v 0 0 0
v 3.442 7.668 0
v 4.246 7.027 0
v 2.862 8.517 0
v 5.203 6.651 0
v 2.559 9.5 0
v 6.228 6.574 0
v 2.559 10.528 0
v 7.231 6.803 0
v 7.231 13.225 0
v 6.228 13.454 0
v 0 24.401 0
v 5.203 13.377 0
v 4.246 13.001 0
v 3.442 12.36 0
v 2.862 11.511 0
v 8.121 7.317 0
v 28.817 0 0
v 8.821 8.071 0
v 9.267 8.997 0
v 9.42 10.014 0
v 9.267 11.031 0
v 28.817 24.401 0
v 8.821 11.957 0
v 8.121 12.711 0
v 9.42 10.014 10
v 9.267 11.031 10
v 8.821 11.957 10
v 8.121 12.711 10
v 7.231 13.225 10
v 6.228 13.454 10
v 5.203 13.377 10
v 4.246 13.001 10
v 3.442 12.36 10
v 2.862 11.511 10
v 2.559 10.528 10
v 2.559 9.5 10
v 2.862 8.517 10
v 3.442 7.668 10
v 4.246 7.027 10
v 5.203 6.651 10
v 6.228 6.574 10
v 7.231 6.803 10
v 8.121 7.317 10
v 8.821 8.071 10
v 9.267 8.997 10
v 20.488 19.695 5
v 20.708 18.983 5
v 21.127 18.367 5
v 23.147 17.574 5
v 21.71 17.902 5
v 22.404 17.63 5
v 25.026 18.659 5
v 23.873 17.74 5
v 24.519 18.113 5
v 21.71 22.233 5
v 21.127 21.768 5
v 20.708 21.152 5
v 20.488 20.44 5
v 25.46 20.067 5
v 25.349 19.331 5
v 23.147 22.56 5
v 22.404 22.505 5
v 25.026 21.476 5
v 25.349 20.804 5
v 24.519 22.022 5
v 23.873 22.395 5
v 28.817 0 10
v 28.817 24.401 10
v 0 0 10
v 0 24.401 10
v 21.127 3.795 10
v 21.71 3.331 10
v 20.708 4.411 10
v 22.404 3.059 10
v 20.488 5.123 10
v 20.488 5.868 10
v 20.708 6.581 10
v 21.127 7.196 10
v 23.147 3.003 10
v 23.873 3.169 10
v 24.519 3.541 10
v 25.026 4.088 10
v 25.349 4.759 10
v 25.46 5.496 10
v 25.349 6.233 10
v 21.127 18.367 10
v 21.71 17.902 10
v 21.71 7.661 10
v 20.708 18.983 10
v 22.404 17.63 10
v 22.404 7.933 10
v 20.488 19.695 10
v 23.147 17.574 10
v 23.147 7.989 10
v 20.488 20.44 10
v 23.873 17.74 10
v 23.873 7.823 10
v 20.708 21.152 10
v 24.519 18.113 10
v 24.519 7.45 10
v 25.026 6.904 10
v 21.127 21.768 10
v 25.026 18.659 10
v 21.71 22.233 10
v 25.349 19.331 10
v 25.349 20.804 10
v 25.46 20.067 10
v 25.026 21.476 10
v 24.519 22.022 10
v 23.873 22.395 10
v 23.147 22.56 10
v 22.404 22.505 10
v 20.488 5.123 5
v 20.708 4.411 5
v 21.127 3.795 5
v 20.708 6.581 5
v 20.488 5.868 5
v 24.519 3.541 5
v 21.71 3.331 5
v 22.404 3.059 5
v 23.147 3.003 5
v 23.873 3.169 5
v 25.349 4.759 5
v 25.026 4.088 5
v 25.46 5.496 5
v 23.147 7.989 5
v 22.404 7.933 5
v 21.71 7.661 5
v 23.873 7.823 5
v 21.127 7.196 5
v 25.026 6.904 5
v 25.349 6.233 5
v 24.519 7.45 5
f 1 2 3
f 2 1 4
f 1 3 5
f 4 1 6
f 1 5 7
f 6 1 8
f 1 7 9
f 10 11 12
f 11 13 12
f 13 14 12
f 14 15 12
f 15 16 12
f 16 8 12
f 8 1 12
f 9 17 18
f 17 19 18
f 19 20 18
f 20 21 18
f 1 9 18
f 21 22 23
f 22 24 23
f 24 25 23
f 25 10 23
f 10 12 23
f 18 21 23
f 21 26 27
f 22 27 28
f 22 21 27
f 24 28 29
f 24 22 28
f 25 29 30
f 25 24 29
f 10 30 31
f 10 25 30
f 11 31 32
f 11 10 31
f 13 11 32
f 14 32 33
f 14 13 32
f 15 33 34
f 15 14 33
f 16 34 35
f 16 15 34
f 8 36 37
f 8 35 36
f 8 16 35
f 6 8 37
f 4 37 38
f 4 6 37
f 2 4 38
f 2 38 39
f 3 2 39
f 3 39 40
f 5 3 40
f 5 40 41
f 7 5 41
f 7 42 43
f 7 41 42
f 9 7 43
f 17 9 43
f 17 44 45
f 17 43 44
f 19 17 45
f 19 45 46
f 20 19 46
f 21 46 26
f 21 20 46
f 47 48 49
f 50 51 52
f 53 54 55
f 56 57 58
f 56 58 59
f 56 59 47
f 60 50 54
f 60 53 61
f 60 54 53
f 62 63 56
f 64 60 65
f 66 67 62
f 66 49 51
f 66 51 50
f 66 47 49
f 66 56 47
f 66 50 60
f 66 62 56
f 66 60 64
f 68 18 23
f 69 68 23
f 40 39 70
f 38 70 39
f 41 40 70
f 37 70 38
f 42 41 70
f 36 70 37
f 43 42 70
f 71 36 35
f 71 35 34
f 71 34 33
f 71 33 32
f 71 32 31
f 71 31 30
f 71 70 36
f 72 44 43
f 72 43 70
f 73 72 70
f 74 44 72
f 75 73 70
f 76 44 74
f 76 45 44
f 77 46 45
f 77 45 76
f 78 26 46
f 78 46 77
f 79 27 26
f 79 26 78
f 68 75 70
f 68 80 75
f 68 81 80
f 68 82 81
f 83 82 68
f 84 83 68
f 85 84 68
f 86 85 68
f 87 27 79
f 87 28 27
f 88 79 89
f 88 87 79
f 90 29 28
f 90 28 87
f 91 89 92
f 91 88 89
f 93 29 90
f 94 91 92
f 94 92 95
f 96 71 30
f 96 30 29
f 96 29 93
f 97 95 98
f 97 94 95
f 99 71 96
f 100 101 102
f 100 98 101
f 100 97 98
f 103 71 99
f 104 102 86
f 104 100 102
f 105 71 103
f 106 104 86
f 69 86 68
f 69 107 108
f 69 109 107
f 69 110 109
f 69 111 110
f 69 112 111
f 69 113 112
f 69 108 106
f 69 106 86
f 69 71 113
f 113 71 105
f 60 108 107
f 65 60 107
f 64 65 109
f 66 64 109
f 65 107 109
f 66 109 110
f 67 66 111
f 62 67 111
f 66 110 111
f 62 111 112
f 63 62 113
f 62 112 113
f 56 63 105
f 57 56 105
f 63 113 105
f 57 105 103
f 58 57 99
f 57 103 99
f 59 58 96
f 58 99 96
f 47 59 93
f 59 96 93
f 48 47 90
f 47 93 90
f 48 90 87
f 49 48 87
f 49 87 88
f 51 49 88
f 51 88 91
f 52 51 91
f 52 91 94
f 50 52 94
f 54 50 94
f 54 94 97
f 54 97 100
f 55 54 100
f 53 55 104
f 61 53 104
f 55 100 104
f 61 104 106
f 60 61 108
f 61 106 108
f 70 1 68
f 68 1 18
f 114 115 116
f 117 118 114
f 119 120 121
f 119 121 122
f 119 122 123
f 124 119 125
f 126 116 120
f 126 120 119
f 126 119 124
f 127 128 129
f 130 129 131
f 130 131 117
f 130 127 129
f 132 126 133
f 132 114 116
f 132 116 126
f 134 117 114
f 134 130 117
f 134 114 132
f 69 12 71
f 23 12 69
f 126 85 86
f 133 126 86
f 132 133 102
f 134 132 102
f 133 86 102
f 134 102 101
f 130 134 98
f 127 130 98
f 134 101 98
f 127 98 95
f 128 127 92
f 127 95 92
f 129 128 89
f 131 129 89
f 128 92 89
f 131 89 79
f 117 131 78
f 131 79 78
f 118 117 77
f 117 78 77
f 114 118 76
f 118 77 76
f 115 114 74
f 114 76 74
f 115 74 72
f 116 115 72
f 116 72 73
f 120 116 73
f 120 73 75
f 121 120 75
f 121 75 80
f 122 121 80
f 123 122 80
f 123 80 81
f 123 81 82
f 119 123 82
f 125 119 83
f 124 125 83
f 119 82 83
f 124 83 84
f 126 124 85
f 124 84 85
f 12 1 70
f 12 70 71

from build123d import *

# Parameters (mm, degrees)
SKETCH_W        = 28.817356
SKETCH_H        = 24.401199
PAD_DEPTH       = 10
SKETCH001_R     = 3.449545
POCKET_DEPTH    = 10.001
SKETCH002_R     = 2.5
POCKET001_DEPTH = 5


with BuildPart() as part:
    # Sketch → Pad (new body)
    with BuildSketch(Plane.XY):
        with Locations((14.408678, 12.200599)):
            Rectangle(SKETCH_W, SKETCH_H)
    extrude(amount=PAD_DEPTH)

    # Sketch001 → Pocket (cut, through all)
    with BuildSketch(Plane.XY):
        with Locations((5.970357, 10.013991)):
            Circle(SKETCH001_R)
    extrude(amount=POCKET_DEPTH, mode=Mode.SUBTRACT)

    # Sketch002 (on Face5 of Pocket) → Pocket001 (cut)
    with BuildSketch(Plane.XY.offset(10)):
        with Locations((22.960093, 5.495847)):
            Circle(SKETCH002_R)
        with Locations((22.960093, 20.067438)):
            Circle(SKETCH002_R)
    extrude(amount=-POCKET001_DEPTH, mode=Mode.SUBTRACT)


solid = part.part
